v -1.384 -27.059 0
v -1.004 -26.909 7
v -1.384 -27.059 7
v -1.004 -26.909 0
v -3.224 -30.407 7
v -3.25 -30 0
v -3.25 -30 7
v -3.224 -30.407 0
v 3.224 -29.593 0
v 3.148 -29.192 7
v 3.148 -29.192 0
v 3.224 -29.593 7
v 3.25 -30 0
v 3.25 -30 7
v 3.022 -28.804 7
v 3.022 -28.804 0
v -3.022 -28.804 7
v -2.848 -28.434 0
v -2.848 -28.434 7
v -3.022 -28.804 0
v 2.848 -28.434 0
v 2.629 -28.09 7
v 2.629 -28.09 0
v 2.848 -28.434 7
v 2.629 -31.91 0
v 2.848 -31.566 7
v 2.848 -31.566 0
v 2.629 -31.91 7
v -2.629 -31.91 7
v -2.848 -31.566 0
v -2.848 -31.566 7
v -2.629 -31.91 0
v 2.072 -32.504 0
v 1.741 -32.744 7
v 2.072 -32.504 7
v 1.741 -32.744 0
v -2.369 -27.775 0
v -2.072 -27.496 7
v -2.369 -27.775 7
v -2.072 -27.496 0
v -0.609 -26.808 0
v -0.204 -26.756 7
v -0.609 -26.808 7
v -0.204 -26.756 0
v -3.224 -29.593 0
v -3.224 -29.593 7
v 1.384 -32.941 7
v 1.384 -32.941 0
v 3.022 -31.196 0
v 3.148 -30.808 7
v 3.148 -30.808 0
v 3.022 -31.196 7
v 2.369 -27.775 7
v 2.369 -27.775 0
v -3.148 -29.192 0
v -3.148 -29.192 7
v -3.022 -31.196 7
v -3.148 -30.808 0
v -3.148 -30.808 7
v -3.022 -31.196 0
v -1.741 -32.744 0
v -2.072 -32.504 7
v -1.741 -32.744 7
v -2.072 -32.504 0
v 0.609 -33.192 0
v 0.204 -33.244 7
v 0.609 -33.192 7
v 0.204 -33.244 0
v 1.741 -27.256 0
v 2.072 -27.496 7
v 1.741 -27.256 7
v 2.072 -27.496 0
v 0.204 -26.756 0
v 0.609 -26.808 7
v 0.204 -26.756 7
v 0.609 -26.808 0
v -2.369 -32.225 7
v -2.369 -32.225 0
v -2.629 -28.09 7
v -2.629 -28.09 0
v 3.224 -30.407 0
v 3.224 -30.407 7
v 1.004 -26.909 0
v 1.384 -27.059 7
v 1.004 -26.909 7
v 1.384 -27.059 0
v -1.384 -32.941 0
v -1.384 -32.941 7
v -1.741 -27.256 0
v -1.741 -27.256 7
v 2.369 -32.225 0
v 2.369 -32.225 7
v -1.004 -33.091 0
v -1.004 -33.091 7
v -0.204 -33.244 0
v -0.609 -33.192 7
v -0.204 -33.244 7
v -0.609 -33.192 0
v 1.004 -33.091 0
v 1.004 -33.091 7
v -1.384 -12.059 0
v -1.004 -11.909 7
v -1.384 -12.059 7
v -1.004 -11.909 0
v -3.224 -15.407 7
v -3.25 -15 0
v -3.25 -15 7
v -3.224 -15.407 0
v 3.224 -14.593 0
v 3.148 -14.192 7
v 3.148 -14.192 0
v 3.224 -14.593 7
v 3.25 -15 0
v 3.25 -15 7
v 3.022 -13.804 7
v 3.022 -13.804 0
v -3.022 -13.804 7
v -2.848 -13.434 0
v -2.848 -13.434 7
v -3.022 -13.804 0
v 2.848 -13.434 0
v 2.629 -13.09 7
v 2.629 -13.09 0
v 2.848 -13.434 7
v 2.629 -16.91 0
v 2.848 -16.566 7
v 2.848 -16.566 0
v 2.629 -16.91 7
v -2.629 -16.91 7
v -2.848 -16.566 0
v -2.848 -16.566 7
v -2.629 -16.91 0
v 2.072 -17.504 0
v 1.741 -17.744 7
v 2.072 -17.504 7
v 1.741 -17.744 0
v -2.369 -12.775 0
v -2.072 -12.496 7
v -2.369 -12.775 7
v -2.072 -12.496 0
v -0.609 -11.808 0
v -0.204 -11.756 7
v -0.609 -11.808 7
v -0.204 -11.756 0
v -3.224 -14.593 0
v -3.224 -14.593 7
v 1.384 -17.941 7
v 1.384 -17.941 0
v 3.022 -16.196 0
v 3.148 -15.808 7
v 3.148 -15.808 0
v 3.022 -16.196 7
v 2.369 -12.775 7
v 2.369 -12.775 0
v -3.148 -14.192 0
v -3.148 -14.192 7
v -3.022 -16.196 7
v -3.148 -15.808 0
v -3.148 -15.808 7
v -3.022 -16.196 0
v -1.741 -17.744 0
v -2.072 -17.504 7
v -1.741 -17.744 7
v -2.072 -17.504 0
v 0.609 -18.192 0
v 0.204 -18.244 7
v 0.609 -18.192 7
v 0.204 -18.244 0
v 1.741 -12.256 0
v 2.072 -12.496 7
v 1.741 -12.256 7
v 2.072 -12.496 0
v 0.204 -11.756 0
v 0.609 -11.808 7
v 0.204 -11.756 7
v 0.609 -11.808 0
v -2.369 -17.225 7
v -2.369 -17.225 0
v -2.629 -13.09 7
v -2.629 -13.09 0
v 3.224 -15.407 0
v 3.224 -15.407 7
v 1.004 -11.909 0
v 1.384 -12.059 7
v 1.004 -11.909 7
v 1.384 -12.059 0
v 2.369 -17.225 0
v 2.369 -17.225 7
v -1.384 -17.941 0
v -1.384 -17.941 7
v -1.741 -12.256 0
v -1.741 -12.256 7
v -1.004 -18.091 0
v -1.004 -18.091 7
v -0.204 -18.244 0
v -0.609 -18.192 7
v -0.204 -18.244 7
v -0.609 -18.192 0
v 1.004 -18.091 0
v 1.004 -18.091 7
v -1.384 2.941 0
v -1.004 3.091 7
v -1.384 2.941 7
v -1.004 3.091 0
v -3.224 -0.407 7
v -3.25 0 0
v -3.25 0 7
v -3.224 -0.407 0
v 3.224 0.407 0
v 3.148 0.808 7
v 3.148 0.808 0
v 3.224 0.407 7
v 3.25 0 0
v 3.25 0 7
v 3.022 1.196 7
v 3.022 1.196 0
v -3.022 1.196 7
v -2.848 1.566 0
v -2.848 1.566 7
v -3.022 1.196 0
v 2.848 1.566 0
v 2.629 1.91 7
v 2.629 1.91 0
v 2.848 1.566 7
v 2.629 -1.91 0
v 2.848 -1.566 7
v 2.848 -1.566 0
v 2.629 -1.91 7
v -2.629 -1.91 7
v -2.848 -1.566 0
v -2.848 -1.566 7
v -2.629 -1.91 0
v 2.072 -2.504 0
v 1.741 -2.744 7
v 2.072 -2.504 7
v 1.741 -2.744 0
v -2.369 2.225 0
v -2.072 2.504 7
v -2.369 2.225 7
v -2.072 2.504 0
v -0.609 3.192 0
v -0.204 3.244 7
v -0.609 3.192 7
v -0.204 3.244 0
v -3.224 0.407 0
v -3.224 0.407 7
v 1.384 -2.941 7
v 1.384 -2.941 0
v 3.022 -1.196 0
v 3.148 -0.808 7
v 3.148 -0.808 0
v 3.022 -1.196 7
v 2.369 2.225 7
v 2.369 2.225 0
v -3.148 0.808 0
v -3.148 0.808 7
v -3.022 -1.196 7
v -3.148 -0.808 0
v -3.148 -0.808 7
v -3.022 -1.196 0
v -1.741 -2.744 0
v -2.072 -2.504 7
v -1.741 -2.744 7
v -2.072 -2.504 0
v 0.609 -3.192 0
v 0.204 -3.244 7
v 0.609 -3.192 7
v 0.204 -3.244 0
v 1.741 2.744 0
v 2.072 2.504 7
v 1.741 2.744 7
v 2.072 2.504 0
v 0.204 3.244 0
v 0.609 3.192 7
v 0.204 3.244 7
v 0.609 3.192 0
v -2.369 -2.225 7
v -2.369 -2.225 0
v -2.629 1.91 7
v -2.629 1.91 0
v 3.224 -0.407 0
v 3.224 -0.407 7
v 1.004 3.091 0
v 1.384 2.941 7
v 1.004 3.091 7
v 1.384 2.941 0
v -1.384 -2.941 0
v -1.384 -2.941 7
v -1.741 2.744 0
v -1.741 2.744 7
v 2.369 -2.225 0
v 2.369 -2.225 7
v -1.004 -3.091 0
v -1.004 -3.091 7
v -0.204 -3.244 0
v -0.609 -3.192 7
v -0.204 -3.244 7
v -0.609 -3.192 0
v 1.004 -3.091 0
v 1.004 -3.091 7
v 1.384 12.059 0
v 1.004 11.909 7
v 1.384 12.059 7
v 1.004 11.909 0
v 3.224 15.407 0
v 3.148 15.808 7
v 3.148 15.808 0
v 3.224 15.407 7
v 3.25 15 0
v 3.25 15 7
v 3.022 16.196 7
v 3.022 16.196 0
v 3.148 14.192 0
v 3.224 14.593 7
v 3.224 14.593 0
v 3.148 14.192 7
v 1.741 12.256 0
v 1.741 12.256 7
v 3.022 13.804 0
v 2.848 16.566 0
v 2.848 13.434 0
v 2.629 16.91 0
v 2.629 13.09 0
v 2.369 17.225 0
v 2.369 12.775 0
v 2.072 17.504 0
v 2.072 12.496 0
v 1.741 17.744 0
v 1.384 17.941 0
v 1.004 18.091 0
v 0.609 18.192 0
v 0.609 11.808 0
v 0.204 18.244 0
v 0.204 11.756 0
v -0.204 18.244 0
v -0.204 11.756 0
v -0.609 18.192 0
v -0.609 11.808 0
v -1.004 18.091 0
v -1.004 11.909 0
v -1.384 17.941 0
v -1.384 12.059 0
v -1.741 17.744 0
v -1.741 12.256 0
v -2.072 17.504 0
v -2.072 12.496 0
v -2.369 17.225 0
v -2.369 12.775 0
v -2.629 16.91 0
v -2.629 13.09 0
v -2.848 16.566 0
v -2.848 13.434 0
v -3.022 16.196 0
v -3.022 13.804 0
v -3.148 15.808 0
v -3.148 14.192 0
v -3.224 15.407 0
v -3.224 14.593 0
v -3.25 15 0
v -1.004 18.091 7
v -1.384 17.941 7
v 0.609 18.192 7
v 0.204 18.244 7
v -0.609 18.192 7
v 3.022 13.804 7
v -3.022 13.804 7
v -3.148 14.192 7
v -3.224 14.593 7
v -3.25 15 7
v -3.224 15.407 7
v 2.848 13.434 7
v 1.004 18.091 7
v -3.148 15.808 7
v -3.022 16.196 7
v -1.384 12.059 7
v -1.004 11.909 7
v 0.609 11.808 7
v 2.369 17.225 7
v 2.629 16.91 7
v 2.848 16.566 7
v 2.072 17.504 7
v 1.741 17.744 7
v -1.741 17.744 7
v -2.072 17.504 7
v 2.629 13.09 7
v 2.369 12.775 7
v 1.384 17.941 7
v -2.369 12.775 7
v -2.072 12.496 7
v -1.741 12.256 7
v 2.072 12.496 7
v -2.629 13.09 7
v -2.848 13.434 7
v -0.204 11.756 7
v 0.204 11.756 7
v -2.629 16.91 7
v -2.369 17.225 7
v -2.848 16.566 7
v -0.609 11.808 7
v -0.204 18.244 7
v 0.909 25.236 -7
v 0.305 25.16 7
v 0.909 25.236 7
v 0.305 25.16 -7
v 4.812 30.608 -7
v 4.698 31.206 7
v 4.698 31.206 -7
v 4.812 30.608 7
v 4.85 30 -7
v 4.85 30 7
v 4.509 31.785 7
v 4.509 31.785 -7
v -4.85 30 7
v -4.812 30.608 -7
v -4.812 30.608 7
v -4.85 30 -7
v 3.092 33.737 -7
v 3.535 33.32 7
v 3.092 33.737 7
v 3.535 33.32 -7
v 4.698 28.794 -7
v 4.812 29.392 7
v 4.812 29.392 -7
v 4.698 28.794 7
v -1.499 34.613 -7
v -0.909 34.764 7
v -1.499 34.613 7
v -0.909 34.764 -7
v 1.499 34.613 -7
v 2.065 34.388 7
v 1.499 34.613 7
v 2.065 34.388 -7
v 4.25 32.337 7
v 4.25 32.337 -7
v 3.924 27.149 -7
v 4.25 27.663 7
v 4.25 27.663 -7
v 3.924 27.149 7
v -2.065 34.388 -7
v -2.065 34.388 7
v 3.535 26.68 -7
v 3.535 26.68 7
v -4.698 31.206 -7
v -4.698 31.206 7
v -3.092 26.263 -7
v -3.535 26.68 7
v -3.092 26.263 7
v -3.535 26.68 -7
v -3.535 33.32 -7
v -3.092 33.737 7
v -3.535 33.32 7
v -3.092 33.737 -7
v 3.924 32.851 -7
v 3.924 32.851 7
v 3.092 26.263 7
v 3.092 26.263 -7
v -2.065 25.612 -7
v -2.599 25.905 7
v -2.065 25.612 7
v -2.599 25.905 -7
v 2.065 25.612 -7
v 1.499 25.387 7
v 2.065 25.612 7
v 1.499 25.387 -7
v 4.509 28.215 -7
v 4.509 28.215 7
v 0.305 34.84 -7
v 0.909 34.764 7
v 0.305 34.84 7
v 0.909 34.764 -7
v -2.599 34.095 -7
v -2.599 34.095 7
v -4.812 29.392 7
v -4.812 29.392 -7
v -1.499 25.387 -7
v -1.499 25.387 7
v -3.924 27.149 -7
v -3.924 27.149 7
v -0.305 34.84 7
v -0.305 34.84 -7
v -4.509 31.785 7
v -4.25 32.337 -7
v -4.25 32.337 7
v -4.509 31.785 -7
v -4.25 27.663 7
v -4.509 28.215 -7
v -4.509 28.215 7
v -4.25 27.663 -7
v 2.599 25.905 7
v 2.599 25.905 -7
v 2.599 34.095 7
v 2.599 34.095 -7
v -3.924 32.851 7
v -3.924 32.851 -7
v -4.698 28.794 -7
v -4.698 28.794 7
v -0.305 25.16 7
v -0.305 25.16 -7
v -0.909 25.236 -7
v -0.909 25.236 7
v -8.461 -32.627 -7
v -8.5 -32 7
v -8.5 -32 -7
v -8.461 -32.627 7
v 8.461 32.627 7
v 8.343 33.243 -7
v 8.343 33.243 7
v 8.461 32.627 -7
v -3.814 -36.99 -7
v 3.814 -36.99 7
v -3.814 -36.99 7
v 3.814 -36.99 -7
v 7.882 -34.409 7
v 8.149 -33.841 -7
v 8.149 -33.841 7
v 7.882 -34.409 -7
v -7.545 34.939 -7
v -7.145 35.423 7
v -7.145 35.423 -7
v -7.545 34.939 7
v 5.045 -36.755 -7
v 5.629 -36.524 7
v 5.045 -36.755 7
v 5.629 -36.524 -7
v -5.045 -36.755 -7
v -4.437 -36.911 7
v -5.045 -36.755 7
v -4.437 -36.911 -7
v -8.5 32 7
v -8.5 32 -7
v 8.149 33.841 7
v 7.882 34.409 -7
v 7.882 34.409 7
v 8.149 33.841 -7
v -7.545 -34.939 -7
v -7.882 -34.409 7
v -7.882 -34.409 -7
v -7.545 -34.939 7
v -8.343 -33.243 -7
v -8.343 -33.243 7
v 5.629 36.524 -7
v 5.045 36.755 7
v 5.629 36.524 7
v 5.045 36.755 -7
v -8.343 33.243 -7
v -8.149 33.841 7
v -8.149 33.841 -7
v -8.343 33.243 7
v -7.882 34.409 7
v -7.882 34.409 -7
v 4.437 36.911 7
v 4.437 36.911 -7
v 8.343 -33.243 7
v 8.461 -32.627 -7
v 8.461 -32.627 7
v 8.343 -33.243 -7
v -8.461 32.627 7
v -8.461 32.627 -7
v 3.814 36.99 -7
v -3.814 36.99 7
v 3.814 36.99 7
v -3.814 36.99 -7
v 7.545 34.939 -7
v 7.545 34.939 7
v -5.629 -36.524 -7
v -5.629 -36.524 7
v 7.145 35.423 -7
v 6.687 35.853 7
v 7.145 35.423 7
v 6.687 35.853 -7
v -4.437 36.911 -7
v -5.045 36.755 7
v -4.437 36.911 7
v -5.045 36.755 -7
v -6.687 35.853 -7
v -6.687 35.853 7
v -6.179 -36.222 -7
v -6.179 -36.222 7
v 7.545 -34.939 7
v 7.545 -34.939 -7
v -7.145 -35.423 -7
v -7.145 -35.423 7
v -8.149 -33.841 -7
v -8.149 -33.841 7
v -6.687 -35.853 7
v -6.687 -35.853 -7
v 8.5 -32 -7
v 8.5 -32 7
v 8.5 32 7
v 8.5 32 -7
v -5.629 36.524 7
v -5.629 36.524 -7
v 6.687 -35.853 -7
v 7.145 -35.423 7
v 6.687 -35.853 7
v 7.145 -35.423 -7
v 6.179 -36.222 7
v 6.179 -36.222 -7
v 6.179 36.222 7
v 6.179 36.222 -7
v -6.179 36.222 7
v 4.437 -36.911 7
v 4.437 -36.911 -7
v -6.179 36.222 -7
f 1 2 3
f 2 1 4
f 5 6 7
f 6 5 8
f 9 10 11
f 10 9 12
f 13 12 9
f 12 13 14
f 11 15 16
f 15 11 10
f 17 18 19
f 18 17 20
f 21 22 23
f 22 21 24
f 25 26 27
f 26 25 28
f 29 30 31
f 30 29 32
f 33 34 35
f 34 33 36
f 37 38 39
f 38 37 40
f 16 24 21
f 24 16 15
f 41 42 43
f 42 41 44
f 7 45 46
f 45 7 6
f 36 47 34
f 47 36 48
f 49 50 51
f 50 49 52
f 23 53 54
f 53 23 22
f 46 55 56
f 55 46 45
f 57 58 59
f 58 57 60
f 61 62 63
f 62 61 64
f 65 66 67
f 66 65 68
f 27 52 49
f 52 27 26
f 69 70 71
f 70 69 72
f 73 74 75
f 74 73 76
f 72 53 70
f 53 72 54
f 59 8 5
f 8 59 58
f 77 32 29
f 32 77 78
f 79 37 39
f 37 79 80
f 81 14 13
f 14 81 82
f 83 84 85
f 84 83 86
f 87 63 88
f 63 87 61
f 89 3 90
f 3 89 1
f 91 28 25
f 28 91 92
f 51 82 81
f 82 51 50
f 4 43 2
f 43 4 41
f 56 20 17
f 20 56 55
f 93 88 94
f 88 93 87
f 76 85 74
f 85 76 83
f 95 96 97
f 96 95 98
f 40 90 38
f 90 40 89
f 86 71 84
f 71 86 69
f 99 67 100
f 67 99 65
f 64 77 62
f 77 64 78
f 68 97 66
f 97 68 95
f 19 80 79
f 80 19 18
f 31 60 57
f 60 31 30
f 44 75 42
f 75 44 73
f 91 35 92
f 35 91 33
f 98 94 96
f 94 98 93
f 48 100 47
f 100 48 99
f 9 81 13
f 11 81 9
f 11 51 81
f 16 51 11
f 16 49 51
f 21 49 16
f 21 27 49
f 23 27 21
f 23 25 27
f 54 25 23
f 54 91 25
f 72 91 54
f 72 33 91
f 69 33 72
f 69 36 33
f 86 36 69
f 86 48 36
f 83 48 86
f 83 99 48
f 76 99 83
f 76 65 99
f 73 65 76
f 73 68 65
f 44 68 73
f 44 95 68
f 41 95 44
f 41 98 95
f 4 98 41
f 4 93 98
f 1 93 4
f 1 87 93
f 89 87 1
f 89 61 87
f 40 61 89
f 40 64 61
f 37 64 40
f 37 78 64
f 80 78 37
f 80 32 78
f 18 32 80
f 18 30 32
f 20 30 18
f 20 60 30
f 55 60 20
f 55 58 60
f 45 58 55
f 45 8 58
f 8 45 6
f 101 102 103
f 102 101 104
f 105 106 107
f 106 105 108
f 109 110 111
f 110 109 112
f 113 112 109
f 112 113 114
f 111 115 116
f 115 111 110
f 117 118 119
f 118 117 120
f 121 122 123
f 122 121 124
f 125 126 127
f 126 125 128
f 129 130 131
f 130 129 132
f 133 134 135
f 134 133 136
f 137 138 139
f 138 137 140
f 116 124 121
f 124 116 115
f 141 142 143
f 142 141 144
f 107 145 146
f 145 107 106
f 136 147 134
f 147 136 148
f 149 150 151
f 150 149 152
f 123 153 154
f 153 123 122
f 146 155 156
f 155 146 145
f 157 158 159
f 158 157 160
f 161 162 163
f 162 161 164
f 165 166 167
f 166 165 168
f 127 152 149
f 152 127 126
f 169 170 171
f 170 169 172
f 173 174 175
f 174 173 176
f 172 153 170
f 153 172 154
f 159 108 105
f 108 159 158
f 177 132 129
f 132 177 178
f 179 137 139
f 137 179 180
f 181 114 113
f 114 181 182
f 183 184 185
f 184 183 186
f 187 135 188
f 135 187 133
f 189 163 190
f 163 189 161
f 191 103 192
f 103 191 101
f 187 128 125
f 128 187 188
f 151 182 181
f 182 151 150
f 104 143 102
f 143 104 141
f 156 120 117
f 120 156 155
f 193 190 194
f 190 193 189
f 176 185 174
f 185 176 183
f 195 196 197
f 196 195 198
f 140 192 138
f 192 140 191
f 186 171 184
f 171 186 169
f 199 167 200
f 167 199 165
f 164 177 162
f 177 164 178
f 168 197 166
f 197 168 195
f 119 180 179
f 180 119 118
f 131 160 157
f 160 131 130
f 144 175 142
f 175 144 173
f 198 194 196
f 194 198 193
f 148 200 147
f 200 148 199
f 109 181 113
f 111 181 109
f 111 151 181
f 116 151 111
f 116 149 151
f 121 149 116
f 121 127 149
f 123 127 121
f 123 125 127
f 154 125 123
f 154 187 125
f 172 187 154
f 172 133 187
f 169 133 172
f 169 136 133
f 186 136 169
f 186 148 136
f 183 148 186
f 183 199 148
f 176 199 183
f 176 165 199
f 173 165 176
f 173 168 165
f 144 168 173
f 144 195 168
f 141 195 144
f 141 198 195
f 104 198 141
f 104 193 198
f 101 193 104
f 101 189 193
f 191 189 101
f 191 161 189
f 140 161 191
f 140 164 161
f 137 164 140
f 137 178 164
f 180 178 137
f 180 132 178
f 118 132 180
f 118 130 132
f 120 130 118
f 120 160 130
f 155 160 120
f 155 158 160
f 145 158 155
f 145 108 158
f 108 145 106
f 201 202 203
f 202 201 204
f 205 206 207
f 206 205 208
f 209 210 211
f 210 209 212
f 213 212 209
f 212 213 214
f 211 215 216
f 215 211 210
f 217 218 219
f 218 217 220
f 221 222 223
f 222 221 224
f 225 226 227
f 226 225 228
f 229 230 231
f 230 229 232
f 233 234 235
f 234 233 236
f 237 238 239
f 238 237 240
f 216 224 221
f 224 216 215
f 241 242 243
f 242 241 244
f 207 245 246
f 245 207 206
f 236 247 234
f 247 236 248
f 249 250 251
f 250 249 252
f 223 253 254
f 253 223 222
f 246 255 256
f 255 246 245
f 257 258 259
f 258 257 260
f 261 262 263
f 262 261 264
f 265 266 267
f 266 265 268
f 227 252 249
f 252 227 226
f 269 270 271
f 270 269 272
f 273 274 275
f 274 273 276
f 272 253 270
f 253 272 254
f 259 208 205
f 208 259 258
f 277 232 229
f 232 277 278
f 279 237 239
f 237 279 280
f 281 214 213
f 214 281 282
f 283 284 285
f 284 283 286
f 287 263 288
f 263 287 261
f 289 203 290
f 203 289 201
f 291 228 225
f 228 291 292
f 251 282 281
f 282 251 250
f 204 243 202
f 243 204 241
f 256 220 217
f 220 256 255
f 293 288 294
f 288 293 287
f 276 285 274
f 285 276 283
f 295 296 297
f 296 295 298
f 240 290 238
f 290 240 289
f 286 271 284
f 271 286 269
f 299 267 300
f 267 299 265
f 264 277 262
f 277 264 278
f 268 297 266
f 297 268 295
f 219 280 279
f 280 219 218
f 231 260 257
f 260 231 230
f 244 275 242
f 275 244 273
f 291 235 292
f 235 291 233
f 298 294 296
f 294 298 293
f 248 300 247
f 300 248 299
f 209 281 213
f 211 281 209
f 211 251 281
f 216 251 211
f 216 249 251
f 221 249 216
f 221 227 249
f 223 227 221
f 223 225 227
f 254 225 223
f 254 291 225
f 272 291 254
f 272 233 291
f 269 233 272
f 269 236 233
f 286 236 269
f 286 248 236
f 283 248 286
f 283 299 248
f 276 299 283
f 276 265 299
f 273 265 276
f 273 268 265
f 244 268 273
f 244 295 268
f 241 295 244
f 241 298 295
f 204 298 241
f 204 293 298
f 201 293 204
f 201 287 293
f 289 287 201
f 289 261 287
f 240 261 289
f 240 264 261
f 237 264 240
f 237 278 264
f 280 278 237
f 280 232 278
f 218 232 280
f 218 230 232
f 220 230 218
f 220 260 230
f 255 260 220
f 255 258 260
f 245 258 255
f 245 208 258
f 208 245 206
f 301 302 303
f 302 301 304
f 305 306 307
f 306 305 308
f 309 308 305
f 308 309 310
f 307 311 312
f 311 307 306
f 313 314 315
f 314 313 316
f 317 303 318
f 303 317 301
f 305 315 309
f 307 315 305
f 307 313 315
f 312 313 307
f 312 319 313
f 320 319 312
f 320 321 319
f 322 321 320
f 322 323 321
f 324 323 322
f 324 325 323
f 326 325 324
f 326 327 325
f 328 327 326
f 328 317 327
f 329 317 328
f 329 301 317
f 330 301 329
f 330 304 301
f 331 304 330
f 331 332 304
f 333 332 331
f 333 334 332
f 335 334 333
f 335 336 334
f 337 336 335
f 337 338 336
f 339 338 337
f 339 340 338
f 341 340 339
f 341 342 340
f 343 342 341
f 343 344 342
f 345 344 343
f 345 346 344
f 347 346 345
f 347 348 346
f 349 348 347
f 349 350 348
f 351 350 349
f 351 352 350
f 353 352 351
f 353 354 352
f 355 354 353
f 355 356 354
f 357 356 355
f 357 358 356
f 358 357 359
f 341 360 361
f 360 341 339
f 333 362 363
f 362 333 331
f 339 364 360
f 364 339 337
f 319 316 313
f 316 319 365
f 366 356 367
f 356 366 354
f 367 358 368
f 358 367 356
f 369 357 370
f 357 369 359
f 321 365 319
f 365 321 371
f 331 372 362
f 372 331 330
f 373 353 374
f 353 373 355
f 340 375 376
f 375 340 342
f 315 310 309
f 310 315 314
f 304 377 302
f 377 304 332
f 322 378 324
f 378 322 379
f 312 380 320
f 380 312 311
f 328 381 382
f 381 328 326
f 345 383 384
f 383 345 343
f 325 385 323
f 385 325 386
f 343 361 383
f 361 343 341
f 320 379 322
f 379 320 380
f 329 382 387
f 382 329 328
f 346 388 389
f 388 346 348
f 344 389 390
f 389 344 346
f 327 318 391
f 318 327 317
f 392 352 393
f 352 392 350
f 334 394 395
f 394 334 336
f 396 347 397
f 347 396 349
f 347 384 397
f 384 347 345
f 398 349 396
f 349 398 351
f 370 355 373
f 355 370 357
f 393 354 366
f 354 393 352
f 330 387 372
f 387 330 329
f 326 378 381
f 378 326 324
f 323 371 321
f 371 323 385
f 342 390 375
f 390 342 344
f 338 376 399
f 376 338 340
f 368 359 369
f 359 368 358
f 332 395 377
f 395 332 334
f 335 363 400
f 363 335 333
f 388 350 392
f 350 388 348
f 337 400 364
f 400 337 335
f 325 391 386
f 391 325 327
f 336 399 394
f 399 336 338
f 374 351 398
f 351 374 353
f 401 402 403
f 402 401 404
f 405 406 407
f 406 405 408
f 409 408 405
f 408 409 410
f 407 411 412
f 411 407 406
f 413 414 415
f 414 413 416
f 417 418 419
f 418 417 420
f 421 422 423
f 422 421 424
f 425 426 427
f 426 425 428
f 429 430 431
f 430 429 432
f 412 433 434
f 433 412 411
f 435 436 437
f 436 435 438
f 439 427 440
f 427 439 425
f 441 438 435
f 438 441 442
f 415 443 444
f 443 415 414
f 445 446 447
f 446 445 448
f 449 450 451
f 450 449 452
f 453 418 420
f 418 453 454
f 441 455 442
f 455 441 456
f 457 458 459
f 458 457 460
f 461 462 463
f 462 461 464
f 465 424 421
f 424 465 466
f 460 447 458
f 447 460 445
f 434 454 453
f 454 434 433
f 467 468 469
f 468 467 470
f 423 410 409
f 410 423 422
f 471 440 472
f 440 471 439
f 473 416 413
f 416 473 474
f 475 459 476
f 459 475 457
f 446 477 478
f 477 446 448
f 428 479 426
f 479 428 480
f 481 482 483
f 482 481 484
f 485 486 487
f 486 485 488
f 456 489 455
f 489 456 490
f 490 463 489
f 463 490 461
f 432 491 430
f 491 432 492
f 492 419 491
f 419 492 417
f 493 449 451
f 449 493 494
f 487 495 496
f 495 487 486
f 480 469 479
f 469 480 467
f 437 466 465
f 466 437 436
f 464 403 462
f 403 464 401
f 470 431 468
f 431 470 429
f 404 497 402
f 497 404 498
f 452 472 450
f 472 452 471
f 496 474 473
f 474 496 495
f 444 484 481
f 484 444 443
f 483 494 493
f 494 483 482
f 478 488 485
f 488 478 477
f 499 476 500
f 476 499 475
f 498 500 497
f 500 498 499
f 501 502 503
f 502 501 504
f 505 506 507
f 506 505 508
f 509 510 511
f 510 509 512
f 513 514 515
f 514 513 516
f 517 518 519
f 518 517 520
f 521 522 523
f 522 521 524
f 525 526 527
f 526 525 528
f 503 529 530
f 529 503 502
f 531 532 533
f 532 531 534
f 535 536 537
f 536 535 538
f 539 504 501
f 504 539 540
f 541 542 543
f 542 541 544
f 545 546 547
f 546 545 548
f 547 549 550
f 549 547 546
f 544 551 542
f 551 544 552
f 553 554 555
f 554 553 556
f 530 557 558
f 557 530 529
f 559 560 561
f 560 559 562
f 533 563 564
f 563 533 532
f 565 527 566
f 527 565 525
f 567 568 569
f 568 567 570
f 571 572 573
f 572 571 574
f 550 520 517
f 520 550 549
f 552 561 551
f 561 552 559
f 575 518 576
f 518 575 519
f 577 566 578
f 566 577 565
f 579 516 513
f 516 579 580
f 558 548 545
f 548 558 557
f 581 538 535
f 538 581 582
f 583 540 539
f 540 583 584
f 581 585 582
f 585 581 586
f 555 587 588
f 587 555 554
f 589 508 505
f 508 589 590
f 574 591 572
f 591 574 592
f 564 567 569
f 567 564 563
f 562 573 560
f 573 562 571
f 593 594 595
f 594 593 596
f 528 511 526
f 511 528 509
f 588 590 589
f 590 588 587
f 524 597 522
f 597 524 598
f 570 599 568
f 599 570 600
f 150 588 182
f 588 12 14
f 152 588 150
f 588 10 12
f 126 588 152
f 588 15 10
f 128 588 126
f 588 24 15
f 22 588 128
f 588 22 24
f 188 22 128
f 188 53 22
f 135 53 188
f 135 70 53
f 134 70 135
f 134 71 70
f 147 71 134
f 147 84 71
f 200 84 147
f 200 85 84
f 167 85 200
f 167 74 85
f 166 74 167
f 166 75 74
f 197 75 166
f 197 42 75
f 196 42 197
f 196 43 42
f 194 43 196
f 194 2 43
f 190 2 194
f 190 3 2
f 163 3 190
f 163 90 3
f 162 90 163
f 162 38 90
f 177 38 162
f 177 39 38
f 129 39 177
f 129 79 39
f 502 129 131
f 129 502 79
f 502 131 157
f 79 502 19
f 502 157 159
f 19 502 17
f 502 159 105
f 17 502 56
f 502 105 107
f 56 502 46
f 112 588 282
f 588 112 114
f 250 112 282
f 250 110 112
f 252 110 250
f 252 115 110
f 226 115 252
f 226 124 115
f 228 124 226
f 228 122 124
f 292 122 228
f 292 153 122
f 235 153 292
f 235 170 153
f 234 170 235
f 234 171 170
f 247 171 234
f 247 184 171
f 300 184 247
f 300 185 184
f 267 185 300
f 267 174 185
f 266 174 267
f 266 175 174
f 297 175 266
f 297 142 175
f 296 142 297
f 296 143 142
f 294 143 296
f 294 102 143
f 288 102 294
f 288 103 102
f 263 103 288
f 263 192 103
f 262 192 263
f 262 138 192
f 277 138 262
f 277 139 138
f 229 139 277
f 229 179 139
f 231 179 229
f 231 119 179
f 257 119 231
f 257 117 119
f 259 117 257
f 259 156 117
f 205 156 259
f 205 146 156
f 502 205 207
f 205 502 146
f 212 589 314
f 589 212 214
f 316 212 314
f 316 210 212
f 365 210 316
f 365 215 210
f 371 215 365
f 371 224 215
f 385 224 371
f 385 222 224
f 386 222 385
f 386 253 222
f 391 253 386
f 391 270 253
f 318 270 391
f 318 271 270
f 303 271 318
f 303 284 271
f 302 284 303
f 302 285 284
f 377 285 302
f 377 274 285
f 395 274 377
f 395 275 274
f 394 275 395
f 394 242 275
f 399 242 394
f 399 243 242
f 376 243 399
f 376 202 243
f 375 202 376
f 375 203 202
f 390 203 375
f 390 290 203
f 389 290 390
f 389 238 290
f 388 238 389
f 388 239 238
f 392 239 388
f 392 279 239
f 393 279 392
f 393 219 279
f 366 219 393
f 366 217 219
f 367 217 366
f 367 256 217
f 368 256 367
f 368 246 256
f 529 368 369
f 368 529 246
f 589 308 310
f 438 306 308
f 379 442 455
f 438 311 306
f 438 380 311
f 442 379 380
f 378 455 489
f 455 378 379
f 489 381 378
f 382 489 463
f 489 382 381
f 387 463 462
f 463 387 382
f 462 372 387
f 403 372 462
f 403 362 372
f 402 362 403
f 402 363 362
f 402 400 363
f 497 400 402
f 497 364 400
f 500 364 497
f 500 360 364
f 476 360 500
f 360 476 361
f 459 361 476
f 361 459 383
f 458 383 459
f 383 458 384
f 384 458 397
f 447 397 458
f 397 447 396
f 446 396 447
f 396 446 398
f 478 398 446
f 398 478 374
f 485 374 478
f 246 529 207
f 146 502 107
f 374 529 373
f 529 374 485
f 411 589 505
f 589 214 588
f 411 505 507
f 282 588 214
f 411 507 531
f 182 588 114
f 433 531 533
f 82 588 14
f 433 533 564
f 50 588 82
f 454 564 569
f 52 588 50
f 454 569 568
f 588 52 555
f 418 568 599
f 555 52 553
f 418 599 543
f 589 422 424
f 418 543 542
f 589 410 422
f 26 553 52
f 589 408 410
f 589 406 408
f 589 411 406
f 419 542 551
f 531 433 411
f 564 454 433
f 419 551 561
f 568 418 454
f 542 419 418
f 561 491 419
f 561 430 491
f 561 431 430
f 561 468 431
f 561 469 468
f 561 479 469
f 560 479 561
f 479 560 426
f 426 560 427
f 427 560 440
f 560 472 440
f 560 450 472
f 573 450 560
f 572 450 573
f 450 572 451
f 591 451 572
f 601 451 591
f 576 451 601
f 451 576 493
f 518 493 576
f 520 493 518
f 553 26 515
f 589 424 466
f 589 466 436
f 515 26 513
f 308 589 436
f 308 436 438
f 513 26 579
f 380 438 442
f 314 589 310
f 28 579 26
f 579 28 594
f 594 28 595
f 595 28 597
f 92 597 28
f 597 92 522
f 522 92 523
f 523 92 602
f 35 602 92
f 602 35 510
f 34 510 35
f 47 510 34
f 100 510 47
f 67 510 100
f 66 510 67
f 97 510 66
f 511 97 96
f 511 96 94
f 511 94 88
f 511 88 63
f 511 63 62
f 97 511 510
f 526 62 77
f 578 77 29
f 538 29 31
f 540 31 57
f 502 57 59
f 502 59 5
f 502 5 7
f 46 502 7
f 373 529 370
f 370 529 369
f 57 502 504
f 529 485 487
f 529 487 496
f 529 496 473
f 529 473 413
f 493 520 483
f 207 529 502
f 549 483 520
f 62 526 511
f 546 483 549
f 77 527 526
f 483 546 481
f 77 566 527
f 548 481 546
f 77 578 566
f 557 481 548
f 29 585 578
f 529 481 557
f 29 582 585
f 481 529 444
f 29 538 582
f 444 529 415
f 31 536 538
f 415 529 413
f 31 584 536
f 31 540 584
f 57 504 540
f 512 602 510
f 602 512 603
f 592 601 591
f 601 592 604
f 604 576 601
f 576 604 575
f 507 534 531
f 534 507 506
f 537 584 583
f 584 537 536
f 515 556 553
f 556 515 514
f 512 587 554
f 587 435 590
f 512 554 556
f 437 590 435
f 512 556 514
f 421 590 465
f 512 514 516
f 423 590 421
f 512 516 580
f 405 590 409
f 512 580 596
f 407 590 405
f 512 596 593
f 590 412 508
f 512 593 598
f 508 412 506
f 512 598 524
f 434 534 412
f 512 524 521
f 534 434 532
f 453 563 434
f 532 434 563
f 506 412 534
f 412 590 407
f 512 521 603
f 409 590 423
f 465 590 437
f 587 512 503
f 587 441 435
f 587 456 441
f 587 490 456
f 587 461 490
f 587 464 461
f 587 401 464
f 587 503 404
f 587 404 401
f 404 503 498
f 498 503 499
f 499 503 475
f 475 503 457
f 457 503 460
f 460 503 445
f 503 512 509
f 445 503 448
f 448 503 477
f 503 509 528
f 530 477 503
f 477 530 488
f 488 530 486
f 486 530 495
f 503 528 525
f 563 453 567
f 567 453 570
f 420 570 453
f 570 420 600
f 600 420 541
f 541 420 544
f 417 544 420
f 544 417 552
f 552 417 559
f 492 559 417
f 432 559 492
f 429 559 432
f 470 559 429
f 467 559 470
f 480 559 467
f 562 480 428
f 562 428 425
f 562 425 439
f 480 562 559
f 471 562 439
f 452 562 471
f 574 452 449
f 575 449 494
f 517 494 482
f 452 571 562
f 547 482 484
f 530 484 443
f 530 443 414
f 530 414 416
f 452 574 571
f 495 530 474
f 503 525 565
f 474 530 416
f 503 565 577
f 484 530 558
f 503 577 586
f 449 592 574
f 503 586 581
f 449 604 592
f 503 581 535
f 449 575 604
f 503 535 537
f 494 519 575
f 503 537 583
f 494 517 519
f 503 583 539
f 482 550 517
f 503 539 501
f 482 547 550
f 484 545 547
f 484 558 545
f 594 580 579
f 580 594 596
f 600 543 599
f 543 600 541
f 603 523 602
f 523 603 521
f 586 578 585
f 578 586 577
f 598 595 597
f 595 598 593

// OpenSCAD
$fn = 50;


difference() {
	union() {
		translate(v = [0, 0, -7.0000000000]) {
			hull() {
				translate(v = [-3.5000000000, 32.0000000000, 0]) {
					cylinder(h = 14, r = 5);
				}
				translate(v = [3.5000000000, 32.0000000000, 0]) {
					cylinder(h = 14, r = 5);
				}
				translate(v = [-3.5000000000, -32.0000000000, 0]) {
					cylinder(h = 14, r = 5);
				}
				translate(v = [3.5000000000, -32.0000000000, 0]) {
					cylinder(h = 14, r = 5);
				}
			}
		}
	}
	union() {
		translate(v = [0.0000000000, -30.0000000000, 0]) {
			cylinder(h = 100, r = 3.2500000000);
		}
		translate(v = [0.0000000000, -15.0000000000, 0]) {
			cylinder(h = 100, r = 3.2500000000);
		}
		cylinder(h = 100, r = 3.2500000000);
		translate(v = [0.0000000000, 15.0000000000, 0]) {
			cylinder(h = 100, r = 3.2500000000);
		}
		translate(v = [0, 30, -100.0000000000]) {
			cylinder(h = 200, r = 4.8500000000);
		}
	}
}
